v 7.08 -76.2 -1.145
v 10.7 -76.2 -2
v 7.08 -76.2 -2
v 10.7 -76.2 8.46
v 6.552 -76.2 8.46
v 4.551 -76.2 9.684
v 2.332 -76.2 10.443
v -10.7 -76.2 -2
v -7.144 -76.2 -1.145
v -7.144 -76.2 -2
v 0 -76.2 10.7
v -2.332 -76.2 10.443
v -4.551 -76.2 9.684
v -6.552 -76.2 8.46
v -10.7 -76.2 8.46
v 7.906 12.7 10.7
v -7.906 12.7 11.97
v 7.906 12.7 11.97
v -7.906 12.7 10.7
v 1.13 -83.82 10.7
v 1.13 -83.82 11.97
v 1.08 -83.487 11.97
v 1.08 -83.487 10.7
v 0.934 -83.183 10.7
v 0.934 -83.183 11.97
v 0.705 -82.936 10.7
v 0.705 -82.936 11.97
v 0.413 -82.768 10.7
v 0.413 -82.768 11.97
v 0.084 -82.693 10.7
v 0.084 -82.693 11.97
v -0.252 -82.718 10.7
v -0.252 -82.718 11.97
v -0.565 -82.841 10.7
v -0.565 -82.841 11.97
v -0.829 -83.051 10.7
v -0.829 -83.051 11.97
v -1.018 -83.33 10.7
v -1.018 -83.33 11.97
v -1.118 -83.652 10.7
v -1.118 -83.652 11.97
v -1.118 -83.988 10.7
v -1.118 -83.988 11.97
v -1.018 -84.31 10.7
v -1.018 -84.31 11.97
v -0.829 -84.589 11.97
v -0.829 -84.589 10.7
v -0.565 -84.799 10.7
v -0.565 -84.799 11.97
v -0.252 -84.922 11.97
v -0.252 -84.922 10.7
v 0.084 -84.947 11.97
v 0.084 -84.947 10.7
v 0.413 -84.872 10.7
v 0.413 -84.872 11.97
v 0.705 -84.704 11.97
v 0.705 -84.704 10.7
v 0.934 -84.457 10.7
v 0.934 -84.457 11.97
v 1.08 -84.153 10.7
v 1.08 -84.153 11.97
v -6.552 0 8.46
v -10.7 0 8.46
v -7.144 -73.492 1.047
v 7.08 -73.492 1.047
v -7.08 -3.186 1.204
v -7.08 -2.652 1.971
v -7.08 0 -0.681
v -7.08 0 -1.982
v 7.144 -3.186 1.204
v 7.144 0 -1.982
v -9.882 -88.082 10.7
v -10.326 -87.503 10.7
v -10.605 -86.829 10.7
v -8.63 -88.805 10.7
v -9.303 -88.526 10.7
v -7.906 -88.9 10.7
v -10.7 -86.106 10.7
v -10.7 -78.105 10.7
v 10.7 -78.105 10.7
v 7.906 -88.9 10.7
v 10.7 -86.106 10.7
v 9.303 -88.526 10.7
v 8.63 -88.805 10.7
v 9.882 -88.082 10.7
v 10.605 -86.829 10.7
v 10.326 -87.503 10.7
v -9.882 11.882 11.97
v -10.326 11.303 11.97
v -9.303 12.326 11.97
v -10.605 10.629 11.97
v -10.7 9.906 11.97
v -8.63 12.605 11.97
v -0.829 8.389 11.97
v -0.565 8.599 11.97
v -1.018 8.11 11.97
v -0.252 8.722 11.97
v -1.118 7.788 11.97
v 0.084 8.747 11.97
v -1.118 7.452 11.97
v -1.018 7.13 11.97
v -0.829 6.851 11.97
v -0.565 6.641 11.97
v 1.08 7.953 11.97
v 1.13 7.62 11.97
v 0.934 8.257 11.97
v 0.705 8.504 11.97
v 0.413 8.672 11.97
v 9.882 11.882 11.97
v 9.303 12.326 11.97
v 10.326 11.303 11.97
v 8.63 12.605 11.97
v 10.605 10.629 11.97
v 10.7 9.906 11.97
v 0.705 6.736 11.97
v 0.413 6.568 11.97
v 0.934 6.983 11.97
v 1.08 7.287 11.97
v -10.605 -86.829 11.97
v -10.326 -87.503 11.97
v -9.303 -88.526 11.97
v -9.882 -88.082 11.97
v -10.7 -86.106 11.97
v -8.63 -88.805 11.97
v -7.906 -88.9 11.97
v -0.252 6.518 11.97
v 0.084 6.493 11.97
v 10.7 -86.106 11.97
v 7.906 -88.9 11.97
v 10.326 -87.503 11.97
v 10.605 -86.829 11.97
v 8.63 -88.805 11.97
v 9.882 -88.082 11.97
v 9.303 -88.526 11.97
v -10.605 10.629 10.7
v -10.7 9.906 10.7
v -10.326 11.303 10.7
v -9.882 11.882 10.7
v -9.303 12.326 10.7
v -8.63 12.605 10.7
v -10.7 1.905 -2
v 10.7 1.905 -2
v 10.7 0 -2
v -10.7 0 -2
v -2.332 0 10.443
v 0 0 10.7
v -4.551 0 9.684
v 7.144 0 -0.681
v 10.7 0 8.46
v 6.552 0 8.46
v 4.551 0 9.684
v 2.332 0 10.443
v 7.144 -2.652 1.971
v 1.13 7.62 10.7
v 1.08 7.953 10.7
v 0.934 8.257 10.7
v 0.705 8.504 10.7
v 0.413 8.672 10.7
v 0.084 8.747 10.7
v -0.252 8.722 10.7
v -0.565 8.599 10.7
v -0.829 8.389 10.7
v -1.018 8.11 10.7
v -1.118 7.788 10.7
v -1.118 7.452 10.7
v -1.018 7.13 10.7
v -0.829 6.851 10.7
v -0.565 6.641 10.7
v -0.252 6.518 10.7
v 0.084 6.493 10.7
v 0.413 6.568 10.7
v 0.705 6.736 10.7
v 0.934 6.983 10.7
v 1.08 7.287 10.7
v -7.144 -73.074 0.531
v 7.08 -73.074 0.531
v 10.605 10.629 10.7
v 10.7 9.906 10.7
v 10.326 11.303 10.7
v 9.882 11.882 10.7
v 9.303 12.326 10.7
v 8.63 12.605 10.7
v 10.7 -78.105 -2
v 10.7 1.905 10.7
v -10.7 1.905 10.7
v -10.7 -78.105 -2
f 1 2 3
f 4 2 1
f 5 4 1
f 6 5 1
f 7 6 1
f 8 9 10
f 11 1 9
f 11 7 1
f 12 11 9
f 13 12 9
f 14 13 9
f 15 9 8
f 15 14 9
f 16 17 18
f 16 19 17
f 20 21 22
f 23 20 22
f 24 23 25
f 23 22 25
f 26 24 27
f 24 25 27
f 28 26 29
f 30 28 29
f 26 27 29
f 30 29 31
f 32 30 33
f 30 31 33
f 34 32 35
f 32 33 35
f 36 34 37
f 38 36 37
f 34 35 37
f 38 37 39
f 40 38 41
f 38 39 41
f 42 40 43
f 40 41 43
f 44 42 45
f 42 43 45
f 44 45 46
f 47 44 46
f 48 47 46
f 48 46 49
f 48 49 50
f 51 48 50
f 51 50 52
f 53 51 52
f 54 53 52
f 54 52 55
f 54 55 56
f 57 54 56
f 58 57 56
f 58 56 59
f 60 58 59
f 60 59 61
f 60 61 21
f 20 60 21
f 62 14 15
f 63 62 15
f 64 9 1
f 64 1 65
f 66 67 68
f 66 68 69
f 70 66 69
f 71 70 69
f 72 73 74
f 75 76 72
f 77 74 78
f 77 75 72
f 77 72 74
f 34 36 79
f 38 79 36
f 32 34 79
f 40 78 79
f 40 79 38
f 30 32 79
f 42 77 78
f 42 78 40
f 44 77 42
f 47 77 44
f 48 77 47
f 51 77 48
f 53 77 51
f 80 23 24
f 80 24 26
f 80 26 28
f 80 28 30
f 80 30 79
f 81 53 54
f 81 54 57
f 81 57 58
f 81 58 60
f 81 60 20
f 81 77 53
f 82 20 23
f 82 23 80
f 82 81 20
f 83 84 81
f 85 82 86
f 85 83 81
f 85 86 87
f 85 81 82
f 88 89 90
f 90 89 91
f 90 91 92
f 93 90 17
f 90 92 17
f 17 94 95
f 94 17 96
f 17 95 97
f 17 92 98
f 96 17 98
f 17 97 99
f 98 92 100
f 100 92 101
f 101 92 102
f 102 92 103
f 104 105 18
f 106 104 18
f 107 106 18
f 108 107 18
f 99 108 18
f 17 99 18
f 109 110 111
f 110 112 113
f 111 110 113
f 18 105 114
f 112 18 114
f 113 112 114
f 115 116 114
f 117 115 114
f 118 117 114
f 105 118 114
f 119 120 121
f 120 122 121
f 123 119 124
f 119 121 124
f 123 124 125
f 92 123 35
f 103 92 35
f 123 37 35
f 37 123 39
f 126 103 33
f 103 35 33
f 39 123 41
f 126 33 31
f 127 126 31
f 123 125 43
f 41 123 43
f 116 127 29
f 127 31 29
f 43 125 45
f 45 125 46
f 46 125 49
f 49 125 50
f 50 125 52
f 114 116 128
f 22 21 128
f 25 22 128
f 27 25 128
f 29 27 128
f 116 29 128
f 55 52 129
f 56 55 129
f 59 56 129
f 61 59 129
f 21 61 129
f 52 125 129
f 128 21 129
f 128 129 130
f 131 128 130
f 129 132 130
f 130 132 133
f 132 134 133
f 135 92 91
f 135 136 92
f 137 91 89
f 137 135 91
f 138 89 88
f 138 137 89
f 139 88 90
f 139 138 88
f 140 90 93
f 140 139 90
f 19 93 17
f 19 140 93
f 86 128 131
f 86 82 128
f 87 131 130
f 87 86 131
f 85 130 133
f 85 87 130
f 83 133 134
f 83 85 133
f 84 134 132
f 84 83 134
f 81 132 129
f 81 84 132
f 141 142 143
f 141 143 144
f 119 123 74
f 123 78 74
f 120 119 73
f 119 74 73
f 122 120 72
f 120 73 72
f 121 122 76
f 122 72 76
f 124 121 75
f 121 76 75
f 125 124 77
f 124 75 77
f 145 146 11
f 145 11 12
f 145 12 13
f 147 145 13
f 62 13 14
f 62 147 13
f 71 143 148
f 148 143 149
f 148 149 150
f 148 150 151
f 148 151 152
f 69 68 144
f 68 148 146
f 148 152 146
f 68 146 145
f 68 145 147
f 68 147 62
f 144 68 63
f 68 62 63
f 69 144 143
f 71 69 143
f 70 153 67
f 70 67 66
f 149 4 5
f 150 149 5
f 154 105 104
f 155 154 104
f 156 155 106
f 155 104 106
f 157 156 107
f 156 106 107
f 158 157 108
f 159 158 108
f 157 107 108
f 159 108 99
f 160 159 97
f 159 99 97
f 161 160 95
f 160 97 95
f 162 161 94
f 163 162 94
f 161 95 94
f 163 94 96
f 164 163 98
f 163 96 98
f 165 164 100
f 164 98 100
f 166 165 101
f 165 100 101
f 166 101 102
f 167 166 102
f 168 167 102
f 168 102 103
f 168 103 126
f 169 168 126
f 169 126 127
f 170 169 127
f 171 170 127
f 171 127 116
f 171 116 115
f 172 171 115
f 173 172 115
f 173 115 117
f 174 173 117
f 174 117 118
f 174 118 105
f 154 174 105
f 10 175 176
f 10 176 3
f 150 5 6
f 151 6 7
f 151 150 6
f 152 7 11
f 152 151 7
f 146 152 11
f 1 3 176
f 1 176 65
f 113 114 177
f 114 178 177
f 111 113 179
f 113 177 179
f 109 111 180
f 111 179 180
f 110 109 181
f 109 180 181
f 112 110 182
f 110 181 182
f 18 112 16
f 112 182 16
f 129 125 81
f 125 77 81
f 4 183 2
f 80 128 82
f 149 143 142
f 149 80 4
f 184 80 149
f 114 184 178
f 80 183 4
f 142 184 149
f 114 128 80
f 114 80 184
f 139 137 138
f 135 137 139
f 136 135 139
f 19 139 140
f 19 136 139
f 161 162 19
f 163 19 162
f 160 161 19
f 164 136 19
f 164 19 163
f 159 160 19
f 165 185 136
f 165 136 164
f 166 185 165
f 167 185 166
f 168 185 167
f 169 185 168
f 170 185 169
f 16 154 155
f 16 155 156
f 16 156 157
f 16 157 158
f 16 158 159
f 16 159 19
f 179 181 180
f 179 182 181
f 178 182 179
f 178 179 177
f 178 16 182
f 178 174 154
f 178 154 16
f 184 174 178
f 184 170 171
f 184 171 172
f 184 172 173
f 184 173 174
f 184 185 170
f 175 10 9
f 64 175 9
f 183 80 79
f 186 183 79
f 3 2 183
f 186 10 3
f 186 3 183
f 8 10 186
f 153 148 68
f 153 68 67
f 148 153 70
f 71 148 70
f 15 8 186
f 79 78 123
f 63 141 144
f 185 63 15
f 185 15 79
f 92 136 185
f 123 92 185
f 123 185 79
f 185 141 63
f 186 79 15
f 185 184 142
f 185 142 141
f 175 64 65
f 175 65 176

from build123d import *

# Parameters (mm, degrees)
BOSS_EXTRUDE3_DEPTH       = 12.7
BOSS_EXTRUDE3_DEPTH_BACK  = 88.9
BOSS_EXTRUDE4_DEPTH       = 76.2
SKETCH3_W                 = 21.40077
SKETCH3_H                 = 1.905
BOSS_EXTRUDE5_DEPTH       = 12.7
SKETCH4_W                 = 21.40077
SKETCH4_H                 = 1.905
BOSS_EXTRUDE6_DEPTH       = 12.7
BOSS_EXTRUDE7_DEPTH       = 17.78
CUT_EXTRUDE1_DEPTH        = 3.556
BOSS_EXTRUDE8_DEPTH       = 17.78
CUT_EXTRUDE2_DEPTH        = 3.556
F_4_40_TAPPED_HOLE1_D     = 2.2606
F_4_40_TAPPED_HOLE1_DEPTH = 7.62
F_4_40_TAPPED_HOLE1_TIP   = 0.679152758
FILLET1_R                 = 2.794


with BuildPart() as part:
    # Sketch2 → Boss-Extrude3 (new, two sides: drawn at the far end of the back side and taken through both)
    with BuildSketch(Plane(origin=(0, 0, 0), x_dir=(1, 0, 0), z_dir=(0, 1, 0)).offset(-BOSS_EXTRUDE3_DEPTH_BACK)):
        Polygon((10.700385, -10.700385), (0, -10.700385), (-10.700385, -10.700385), (-10.700385, -11.970385), (10.700385, -11.970385), align=None)
    extrude(amount=BOSS_EXTRUDE3_DEPTH + BOSS_EXTRUDE3_DEPTH_BACK)

    # Sketch2<3> → Boss-Extrude4 (add)
    with BuildSketch(Plane(origin=(0, 0, 0), x_dir=(1, 0, 0), z_dir=(0, 1, 0))):
        with BuildLine():
            ThreePointArc((0, -10.700385), (-3.462370633, -10.124733515), (-6.552209101, -8.459716014))
            Line((-6.552209101, -8.459716014), (-10.700385, -8.459716014))
            Line((-10.700385, -8.459716014), (-10.700385, -10.700385))
            Line((-10.700385, -10.700385), (0, -10.700385))
        make_face()
        with BuildLine():
            ThreePointArc((6.552209101, -8.459716014), (3.462370633, -10.124733515), (0, -10.700385))
            Line((0, -10.700385), (10.700385, -10.700385))
            Line((10.700385, -10.700385), (10.700385, -8.459716014))
            Line((10.700385, -8.459716014), (6.552209101, -8.459716014))
        make_face()
    extrude(amount=-BOSS_EXTRUDE4_DEPTH)

    # Sketch3 → Boss-Extrude5 (add)
    with BuildSketch(Plane(origin=(0, 0, 10.700385), x_dir=(-1, 0, 0), z_dir=(0, 0, -1))):
        with Locations((0, 0.9525)):
            Rectangle(SKETCH3_W, SKETCH3_H)
    extrude(amount=BOSS_EXTRUDE5_DEPTH)

    # Sketch4 → Boss-Extrude6 (add)
    with BuildSketch(Plane(origin=(0, 0, 10.700385), x_dir=(-1, 0, 0), z_dir=(0, 0, -1))):
        with Locations((0, -77.1525)):
            Rectangle(SKETCH4_W, SKETCH4_H)
    extrude(amount=BOSS_EXTRUDE6_DEPTH)

    # Sketch5 → Boss-Extrude7 (add)
    with BuildSketch(Plane(origin=(10.700385, 0, 0), x_dir=(0, 0, -1), z_dir=(1, 0, 0))):
        Polygon((-1.204354753, -3.186107507), (1.981752753, 0), (0.680653279, 0), (-1.971074087, -2.651727366), align=None)
    extrude(amount=-BOSS_EXTRUDE7_DEPTH)

    # Sketch5<4> → Cut-Extrude1 (cut)
    with BuildSketch(Plane(origin=(10.700385, 0, 0), x_dir=(0, 0, -1), z_dir=(1, 0, 0))):
        Polygon((-1.204354753, -3.186107507), (1.981752753, 0), (0.680653279, 0), (-1.971074087, -2.651727366), align=None)
    extrude(amount=-CUT_EXTRUDE1_DEPTH, mode=Mode.SUBTRACT)

    # Sketch6 → Boss-Extrude8 (add)
    with BuildSketch(Plane.ZY.offset(10.700385)):
        Polygon((0.530524719, -73.074012724), (-1.999615, -76.2), (-1.145153821, -76.2), (1.046780976, -73.49186486), align=None)
    extrude(amount=-BOSS_EXTRUDE8_DEPTH)

    # Sketch6<3> → Cut-Extrude2 (cut)
    with BuildSketch(Plane.ZY.offset(10.700385)):
        Polygon((0.530524719, -73.074012724), (-1.999615, -76.2), (-1.145153821, -76.2), (1.046780976, -73.49186486), align=None)
    extrude(amount=-CUT_EXTRUDE2_DEPTH, mode=Mode.SUBTRACT)

    # #4-40 Tapped Hole1
    with Locations(Plane(origin=(0, 0, 10.700385), x_dir=(-1, 0, 0), z_dir=(0, 0, -1))):
        with Locations((0, -83.82), (0, 7.62)):
            Hole(F_4_40_TAPPED_HOLE1_D / 2, depth=F_4_40_TAPPED_HOLE1_DEPTH)
            with Locations((0, 0, -(F_4_40_TAPPED_HOLE1_DEPTH + F_4_40_TAPPED_HOLE1_TIP / 2))):  # 118° drill point
                Cone(0, F_4_40_TAPPED_HOLE1_D / 2, F_4_40_TAPPED_HOLE1_TIP, mode=Mode.SUBTRACT)

    # Fillet1
    fillet1_edges = [part.edges().sort_by_distance(p)[0] for p in [
        (-10.700385, -88.9, 11.335385),
        (10.700385, -88.9, 11.335385),
        (-10.700385, 12.7, 11.335385),
        (10.700385, 12.7, 11.335385),
    ]]
    fillet(fillet1_edges, radius=FILLET1_R)


solid = part.part
